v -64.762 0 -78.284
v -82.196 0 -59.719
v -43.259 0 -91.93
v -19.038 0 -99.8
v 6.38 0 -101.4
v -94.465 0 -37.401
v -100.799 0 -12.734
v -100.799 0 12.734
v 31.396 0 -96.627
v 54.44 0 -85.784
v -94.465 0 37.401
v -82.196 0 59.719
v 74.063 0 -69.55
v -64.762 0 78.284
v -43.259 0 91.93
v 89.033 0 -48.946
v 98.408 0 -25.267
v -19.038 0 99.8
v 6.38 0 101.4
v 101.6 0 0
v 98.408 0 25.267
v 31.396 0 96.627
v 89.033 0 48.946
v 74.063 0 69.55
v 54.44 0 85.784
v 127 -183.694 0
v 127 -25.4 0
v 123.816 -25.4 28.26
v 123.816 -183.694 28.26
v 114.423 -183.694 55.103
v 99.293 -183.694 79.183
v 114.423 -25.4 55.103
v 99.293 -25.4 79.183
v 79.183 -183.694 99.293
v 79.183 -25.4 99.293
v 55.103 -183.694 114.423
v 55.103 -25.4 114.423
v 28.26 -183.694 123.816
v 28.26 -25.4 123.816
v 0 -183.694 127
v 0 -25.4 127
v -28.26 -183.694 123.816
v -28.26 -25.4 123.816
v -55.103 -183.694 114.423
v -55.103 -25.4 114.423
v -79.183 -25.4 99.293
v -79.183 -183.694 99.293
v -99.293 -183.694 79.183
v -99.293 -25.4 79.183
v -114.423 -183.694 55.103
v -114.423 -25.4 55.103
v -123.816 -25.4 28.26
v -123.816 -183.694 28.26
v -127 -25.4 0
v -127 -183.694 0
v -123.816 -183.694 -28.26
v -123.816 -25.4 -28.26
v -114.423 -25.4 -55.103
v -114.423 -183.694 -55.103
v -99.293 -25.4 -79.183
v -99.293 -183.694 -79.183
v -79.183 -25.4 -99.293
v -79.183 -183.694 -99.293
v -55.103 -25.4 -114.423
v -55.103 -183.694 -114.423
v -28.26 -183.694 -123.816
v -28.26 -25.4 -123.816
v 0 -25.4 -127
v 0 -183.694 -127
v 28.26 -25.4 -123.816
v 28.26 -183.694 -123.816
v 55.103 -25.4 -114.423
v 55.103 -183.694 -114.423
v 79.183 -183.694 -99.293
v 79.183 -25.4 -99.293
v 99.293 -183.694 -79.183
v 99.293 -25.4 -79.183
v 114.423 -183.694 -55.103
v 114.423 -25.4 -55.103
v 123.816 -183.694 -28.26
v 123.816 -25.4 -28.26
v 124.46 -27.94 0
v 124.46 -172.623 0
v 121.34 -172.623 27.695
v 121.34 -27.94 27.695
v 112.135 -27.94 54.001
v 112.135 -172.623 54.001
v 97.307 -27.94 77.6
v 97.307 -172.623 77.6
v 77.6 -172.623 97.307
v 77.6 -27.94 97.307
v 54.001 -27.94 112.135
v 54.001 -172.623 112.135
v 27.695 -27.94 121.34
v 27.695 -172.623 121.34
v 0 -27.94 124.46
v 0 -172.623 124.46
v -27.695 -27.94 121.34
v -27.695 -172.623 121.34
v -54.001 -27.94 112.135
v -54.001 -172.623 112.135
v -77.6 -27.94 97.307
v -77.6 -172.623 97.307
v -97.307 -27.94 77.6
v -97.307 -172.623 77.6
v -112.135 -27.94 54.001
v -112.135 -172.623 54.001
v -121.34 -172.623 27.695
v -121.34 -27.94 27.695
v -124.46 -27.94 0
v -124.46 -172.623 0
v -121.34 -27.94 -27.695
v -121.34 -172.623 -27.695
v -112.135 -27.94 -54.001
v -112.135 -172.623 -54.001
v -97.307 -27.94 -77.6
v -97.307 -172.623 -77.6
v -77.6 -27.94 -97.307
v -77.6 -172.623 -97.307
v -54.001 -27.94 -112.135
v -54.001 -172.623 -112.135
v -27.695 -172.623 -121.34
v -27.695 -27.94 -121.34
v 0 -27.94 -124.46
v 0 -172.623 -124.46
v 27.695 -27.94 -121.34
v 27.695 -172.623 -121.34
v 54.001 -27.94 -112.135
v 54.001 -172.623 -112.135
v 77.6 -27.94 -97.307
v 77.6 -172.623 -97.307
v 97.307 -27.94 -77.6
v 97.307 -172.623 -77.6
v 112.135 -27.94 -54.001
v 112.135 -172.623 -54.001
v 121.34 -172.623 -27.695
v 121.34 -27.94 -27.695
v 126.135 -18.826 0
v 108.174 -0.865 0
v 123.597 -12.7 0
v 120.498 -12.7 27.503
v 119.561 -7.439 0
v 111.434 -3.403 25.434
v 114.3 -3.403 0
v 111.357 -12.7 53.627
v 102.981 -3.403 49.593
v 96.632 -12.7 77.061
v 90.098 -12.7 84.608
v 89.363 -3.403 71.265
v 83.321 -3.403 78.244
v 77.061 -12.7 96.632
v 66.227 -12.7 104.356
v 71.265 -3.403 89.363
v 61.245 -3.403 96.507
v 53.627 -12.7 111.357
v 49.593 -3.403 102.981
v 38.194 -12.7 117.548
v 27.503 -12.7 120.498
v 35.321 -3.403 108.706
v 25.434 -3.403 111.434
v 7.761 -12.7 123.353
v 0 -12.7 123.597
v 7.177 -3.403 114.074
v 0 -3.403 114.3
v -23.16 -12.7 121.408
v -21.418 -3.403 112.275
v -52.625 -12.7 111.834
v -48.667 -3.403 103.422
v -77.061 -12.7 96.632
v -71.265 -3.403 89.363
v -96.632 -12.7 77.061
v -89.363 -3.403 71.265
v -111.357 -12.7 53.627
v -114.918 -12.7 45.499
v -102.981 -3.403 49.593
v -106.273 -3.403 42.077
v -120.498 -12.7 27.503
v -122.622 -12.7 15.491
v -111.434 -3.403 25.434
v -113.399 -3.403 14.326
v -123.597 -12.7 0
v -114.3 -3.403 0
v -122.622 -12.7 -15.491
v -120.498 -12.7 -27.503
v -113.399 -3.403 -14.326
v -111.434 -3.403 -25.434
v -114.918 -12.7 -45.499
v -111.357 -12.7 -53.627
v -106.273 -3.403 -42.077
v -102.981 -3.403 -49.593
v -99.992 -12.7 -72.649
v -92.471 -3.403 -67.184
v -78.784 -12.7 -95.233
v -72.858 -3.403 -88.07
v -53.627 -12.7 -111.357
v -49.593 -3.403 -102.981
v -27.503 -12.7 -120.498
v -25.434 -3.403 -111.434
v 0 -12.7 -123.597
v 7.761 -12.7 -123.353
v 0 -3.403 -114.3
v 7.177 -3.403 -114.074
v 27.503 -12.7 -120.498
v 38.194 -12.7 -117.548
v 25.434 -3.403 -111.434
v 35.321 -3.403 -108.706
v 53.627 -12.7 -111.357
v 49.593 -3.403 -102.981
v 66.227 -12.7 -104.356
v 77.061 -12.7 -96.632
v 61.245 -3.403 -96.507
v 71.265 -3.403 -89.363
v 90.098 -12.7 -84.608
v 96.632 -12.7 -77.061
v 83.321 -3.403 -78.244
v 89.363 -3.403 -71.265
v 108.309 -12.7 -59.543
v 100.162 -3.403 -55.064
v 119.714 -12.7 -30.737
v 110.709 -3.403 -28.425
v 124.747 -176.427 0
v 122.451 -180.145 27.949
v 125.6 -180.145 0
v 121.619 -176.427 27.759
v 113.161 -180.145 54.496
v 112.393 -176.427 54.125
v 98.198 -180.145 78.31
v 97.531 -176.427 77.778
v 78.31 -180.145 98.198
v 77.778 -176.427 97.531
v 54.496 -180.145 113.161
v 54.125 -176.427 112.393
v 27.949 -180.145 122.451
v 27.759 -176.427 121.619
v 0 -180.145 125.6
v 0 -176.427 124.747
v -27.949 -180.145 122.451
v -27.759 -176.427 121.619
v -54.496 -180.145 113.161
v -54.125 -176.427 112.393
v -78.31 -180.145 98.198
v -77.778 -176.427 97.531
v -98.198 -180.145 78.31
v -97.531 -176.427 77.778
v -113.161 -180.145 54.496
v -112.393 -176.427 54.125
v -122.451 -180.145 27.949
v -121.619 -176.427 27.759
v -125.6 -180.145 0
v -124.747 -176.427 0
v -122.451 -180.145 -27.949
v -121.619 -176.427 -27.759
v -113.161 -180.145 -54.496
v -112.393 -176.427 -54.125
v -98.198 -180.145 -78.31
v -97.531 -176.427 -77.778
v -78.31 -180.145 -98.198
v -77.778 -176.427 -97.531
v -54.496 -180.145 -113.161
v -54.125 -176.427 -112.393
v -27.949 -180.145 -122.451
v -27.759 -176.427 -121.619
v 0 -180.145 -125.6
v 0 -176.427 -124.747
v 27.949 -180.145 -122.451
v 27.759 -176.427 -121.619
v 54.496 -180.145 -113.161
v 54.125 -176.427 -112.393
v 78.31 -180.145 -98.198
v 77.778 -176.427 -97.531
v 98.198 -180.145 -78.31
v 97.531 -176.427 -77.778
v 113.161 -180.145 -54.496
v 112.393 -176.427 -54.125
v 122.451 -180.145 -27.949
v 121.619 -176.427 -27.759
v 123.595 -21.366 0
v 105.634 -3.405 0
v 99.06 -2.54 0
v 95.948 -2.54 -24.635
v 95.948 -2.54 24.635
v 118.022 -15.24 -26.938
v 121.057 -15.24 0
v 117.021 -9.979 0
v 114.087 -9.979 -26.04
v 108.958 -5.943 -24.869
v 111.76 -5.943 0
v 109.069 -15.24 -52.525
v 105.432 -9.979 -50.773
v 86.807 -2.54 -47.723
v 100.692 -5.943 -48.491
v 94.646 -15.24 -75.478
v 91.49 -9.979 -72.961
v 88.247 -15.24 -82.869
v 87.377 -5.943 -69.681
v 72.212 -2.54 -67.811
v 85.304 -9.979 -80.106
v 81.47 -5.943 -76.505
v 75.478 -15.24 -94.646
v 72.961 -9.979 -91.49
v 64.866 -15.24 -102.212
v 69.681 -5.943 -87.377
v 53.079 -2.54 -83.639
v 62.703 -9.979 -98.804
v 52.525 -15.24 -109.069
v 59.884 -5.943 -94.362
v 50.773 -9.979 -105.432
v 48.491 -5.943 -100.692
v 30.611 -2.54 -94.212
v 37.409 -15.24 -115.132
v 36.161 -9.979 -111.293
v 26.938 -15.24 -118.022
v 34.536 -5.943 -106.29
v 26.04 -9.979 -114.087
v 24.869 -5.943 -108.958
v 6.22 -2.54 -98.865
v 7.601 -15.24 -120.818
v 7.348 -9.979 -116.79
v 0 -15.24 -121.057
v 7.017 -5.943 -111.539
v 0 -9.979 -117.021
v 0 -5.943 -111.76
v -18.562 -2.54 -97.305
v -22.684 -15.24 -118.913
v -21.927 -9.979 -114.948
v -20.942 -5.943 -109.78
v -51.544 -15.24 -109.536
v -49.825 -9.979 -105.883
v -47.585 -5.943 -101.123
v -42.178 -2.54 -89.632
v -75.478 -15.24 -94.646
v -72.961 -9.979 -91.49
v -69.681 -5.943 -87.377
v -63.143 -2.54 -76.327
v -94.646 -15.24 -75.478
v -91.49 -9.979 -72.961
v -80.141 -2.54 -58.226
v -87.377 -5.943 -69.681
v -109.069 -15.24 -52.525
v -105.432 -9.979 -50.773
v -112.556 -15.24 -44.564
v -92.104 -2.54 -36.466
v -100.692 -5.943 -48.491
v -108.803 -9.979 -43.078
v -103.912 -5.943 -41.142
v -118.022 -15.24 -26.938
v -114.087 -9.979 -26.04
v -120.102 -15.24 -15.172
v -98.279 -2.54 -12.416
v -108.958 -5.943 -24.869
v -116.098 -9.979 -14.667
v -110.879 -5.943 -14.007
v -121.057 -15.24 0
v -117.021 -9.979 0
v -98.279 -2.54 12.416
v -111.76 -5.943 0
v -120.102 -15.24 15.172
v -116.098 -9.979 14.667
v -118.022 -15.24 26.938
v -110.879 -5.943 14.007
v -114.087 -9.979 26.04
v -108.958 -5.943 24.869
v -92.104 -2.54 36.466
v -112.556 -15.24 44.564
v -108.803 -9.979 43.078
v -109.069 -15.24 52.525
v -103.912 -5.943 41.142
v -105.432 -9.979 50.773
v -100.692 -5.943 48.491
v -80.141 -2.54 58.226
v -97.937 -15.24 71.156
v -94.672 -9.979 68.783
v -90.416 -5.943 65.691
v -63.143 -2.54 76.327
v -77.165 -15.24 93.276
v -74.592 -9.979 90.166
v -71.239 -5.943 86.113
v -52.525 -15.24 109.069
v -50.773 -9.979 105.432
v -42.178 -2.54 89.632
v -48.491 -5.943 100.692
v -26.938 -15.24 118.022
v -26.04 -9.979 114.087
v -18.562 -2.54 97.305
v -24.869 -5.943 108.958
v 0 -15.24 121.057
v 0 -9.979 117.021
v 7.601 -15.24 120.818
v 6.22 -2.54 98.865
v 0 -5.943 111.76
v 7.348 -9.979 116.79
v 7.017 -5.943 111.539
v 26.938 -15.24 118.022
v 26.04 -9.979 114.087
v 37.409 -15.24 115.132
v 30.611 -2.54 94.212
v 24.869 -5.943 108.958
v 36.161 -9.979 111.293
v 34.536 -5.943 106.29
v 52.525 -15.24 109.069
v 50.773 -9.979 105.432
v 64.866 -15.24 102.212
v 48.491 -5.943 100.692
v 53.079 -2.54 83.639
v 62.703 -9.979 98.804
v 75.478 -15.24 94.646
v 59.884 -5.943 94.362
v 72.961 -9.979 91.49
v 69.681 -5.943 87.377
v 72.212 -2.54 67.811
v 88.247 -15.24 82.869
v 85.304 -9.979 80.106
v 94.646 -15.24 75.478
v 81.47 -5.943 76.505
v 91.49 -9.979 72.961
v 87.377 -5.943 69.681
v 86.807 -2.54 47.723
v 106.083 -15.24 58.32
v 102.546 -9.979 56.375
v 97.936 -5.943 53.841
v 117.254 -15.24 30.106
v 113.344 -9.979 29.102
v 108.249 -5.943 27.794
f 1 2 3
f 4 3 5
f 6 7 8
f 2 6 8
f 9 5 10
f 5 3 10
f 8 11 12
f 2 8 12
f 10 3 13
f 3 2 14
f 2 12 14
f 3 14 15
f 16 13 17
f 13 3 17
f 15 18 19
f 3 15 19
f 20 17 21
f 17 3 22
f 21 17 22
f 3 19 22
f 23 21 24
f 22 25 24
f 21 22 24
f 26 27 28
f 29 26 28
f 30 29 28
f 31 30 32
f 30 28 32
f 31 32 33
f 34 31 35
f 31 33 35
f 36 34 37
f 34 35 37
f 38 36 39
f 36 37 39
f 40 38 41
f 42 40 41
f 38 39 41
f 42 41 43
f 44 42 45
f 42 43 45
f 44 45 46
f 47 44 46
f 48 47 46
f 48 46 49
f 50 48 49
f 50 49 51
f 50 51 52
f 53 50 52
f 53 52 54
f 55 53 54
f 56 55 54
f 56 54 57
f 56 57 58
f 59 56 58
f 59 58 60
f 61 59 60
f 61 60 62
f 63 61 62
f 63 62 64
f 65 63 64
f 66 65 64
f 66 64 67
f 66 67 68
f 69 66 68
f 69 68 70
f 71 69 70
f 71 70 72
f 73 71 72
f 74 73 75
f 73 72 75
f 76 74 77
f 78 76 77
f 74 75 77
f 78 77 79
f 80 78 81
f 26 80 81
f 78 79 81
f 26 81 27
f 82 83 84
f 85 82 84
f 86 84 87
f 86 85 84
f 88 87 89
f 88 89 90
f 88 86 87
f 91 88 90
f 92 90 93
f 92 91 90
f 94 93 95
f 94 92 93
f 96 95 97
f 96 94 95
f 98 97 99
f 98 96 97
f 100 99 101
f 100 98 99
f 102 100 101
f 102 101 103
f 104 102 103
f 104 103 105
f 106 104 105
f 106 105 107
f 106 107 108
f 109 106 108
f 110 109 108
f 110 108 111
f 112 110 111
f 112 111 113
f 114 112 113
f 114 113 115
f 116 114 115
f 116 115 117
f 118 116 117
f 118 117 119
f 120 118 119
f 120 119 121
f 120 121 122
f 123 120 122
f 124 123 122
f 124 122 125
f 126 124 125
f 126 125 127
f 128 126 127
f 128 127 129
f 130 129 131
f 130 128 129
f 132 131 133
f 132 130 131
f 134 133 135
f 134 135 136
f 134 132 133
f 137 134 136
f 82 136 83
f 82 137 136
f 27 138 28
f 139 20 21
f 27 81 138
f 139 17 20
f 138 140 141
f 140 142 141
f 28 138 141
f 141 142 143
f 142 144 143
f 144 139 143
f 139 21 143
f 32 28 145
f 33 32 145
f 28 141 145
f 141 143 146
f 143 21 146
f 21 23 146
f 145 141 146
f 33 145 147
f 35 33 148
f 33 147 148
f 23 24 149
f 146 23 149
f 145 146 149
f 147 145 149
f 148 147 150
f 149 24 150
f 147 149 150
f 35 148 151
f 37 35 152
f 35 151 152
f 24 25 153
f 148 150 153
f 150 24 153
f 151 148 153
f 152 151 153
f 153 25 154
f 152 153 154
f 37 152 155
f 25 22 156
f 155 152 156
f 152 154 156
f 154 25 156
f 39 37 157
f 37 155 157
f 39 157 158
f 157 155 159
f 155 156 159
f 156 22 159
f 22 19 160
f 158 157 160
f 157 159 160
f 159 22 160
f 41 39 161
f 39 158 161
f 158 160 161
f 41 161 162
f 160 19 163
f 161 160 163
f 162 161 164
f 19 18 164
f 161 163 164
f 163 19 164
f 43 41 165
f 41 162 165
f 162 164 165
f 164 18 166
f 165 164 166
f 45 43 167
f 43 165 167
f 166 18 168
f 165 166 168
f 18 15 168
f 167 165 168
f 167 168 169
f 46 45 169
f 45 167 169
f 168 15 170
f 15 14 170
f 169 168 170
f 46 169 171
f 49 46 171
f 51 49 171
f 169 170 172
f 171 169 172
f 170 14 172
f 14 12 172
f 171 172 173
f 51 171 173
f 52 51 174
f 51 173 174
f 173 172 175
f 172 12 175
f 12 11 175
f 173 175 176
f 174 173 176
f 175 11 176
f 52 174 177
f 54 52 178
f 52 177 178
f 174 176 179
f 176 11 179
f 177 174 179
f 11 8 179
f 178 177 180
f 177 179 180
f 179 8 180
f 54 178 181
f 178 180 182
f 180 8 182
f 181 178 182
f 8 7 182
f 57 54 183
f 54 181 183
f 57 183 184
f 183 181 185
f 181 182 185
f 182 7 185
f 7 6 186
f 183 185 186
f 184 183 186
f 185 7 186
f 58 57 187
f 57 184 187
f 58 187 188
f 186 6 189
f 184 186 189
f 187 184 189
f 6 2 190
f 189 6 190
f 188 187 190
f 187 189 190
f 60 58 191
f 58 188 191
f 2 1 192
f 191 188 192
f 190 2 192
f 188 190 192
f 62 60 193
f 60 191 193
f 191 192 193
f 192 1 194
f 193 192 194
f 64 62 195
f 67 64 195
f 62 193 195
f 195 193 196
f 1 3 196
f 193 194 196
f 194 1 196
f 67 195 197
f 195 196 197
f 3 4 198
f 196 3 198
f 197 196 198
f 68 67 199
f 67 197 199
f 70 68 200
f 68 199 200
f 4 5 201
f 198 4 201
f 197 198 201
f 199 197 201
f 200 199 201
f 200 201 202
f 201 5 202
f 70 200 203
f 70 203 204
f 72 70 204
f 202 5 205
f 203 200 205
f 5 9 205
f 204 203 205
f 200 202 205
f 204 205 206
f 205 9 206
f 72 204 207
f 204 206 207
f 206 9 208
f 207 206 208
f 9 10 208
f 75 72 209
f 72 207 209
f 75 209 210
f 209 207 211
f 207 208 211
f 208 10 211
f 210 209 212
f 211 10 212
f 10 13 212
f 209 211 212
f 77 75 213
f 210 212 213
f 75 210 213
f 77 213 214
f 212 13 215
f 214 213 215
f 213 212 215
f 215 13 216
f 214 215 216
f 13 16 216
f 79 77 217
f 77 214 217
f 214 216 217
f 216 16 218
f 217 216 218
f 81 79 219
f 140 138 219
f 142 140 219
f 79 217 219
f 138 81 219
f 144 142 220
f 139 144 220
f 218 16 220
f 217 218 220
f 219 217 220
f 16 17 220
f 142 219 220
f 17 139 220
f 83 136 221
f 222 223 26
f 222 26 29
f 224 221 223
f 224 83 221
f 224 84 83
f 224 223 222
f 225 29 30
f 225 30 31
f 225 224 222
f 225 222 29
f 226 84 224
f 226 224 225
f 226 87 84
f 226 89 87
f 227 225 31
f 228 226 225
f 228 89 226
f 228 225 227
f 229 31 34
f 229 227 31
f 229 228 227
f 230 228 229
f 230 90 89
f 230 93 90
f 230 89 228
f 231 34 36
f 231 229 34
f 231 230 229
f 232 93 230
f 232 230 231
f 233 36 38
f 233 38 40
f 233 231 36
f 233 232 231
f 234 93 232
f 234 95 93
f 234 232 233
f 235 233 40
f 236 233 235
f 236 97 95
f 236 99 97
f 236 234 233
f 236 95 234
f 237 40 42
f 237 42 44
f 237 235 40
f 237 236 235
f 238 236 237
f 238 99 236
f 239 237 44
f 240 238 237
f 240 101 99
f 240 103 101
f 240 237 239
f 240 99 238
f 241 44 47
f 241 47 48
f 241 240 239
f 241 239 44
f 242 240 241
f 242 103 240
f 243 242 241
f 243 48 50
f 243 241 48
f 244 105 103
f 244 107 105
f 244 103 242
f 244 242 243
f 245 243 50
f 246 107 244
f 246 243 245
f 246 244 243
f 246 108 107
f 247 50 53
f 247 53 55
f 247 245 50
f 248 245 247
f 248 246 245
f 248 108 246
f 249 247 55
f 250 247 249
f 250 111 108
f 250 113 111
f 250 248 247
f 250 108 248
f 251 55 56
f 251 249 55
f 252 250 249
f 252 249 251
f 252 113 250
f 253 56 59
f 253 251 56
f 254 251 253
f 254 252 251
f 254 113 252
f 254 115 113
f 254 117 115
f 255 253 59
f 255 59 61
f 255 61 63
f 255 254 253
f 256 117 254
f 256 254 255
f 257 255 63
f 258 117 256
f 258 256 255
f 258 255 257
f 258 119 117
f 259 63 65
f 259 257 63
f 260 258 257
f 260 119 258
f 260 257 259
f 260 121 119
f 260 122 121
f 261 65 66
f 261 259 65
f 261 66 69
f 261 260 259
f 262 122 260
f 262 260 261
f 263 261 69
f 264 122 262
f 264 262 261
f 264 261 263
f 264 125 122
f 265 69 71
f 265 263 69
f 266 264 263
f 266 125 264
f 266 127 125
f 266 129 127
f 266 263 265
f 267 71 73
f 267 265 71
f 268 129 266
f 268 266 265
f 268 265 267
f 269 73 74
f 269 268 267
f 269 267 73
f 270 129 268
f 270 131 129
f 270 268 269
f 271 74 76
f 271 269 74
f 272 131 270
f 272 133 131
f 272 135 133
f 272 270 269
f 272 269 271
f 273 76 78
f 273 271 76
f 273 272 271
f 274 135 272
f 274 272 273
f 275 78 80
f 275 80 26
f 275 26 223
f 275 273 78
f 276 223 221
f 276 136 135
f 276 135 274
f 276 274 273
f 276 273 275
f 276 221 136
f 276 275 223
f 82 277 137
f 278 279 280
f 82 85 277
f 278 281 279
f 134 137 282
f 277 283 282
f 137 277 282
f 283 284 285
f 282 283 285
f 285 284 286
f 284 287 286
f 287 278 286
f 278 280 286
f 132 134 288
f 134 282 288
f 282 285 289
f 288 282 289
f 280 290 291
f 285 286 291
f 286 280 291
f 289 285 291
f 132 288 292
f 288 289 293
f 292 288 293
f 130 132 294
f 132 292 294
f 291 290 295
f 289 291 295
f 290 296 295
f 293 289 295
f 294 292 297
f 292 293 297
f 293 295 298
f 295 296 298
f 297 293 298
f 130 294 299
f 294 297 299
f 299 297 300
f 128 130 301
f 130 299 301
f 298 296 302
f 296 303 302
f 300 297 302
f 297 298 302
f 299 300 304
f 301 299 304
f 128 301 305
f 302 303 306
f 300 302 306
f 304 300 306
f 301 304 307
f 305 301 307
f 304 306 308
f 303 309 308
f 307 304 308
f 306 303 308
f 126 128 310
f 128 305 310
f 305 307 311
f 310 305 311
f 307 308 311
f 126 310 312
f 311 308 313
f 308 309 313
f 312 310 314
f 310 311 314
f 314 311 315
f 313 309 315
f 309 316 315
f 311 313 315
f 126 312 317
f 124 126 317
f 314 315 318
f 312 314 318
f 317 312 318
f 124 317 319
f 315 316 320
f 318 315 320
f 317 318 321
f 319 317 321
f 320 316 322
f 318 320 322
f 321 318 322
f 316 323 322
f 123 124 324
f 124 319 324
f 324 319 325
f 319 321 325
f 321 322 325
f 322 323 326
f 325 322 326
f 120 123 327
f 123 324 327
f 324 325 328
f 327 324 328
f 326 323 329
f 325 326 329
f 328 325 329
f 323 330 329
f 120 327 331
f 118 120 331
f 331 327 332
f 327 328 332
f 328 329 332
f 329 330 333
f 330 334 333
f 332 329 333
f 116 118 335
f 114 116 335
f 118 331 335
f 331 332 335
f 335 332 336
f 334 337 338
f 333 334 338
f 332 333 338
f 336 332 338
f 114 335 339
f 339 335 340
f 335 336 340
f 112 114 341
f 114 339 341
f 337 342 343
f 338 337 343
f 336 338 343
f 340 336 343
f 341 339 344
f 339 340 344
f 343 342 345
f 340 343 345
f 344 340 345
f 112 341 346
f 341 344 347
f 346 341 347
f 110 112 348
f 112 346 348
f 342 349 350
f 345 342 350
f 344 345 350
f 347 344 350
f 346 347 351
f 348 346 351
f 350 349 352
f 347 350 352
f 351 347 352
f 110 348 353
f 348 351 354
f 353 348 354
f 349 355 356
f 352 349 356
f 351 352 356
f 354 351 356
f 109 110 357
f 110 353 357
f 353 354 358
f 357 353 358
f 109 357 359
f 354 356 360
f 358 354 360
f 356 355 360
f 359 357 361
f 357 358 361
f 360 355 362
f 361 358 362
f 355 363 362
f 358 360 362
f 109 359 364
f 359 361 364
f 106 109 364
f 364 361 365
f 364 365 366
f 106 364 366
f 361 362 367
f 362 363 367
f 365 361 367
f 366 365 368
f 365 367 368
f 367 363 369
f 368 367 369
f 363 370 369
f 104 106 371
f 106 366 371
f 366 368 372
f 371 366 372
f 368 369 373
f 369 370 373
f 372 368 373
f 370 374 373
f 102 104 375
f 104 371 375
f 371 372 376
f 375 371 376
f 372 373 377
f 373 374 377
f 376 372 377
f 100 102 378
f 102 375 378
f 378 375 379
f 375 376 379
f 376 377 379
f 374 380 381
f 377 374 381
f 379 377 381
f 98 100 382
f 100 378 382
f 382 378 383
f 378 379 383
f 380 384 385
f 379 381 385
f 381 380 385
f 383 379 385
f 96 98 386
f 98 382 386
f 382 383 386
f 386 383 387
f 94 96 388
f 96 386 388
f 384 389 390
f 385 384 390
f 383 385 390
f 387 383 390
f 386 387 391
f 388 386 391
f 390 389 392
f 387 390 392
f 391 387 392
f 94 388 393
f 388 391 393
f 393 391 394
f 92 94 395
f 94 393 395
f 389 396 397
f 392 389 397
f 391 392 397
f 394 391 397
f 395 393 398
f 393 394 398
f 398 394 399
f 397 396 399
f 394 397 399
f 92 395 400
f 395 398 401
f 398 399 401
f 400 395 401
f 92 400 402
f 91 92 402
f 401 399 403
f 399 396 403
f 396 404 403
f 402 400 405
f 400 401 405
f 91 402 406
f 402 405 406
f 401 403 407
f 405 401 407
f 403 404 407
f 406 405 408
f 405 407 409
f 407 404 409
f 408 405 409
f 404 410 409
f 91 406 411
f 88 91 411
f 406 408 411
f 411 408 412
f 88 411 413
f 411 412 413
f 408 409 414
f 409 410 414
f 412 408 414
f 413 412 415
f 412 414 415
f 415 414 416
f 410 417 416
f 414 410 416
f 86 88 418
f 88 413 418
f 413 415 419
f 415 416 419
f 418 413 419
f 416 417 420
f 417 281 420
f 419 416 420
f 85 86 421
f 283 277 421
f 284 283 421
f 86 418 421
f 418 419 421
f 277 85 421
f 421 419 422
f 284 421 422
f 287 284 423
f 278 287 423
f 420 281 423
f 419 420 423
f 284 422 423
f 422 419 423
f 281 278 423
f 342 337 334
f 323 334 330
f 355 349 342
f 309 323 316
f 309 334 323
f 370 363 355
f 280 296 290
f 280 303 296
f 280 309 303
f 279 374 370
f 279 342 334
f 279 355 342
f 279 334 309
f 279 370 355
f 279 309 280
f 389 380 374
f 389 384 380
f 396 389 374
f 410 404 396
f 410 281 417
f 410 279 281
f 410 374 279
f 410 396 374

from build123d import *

# Parameters (mm, degrees)
F0_R     = 127
F1_DEPTH = 183.69425
F2_T     = -2.54


# Not quite as in the source:
# - a fillet or chamfer that OpenCascade refuses, or shapes differently, is made with other operations: its cross-section is extruded or revolved along the edge and cut away or added


with BuildPart() as f1:
    # F0 (on Front) → F1 (new body)
    with BuildSketch(Plane.XZ):
        Circle(F0_R)
    extrude(amount=F1_DEPTH)

    # F2
    f2_openings = [f1.faces().sort_by_distance(p)[0] for p in [
        (0, -183.69425, 0),
    ]]
    offset(amount=F2_T, openings=f2_openings)

    # F3: fillet of radius 25.4 on 3 edges, made by hand

    # F3_s1 → F3_t2 (revolve)
    with BuildSketch(Plane.XY):
        with BuildLine():
            ThreePointArc((124.46, -27.94), (117.0205122421, -9.9794877579), (99.06, -2.54))
            Line((99.06, -2.54), (124.46, -2.54))
            Line((124.46, -2.54), (124.46, -27.94))
        make_face()
    revolve(axis=Axis((0, -2.54, 0), (0, 1, 0)))

    # F3_s3 → F3_t4 (revolve, cut)
    with BuildSketch(Plane.XY):
        with BuildLine():
            ThreePointArc((127, -25.4), (119.5605122421, -7.4394877579), (101.6, 0))
            Line((101.6, 0), (127, 0))
            Line((127, 0), (127, -25.4))
        make_face()
    revolve(axis=Axis((0, 0, 0), (0, -1, 0)), mode=Mode.SUBTRACT)

    # F3_s5 → F3_t6 (revolve, cut)
    with BuildSketch(Plane.XY):
        with BuildLine():
            ThreePointArc((127, -183.69425), (125.1031423642, -178.3022593463), (124.46, -172.6226466834))
            Line((124.46, -172.6226466834), (124.46, -183.69425))
            Line((124.46, -183.69425), (127, -183.69425))
        make_face()
    revolve(axis=Axis((0, -183.69425, 0), (0, -1, 0)), mode=Mode.SUBTRACT)


solid = f1.part
